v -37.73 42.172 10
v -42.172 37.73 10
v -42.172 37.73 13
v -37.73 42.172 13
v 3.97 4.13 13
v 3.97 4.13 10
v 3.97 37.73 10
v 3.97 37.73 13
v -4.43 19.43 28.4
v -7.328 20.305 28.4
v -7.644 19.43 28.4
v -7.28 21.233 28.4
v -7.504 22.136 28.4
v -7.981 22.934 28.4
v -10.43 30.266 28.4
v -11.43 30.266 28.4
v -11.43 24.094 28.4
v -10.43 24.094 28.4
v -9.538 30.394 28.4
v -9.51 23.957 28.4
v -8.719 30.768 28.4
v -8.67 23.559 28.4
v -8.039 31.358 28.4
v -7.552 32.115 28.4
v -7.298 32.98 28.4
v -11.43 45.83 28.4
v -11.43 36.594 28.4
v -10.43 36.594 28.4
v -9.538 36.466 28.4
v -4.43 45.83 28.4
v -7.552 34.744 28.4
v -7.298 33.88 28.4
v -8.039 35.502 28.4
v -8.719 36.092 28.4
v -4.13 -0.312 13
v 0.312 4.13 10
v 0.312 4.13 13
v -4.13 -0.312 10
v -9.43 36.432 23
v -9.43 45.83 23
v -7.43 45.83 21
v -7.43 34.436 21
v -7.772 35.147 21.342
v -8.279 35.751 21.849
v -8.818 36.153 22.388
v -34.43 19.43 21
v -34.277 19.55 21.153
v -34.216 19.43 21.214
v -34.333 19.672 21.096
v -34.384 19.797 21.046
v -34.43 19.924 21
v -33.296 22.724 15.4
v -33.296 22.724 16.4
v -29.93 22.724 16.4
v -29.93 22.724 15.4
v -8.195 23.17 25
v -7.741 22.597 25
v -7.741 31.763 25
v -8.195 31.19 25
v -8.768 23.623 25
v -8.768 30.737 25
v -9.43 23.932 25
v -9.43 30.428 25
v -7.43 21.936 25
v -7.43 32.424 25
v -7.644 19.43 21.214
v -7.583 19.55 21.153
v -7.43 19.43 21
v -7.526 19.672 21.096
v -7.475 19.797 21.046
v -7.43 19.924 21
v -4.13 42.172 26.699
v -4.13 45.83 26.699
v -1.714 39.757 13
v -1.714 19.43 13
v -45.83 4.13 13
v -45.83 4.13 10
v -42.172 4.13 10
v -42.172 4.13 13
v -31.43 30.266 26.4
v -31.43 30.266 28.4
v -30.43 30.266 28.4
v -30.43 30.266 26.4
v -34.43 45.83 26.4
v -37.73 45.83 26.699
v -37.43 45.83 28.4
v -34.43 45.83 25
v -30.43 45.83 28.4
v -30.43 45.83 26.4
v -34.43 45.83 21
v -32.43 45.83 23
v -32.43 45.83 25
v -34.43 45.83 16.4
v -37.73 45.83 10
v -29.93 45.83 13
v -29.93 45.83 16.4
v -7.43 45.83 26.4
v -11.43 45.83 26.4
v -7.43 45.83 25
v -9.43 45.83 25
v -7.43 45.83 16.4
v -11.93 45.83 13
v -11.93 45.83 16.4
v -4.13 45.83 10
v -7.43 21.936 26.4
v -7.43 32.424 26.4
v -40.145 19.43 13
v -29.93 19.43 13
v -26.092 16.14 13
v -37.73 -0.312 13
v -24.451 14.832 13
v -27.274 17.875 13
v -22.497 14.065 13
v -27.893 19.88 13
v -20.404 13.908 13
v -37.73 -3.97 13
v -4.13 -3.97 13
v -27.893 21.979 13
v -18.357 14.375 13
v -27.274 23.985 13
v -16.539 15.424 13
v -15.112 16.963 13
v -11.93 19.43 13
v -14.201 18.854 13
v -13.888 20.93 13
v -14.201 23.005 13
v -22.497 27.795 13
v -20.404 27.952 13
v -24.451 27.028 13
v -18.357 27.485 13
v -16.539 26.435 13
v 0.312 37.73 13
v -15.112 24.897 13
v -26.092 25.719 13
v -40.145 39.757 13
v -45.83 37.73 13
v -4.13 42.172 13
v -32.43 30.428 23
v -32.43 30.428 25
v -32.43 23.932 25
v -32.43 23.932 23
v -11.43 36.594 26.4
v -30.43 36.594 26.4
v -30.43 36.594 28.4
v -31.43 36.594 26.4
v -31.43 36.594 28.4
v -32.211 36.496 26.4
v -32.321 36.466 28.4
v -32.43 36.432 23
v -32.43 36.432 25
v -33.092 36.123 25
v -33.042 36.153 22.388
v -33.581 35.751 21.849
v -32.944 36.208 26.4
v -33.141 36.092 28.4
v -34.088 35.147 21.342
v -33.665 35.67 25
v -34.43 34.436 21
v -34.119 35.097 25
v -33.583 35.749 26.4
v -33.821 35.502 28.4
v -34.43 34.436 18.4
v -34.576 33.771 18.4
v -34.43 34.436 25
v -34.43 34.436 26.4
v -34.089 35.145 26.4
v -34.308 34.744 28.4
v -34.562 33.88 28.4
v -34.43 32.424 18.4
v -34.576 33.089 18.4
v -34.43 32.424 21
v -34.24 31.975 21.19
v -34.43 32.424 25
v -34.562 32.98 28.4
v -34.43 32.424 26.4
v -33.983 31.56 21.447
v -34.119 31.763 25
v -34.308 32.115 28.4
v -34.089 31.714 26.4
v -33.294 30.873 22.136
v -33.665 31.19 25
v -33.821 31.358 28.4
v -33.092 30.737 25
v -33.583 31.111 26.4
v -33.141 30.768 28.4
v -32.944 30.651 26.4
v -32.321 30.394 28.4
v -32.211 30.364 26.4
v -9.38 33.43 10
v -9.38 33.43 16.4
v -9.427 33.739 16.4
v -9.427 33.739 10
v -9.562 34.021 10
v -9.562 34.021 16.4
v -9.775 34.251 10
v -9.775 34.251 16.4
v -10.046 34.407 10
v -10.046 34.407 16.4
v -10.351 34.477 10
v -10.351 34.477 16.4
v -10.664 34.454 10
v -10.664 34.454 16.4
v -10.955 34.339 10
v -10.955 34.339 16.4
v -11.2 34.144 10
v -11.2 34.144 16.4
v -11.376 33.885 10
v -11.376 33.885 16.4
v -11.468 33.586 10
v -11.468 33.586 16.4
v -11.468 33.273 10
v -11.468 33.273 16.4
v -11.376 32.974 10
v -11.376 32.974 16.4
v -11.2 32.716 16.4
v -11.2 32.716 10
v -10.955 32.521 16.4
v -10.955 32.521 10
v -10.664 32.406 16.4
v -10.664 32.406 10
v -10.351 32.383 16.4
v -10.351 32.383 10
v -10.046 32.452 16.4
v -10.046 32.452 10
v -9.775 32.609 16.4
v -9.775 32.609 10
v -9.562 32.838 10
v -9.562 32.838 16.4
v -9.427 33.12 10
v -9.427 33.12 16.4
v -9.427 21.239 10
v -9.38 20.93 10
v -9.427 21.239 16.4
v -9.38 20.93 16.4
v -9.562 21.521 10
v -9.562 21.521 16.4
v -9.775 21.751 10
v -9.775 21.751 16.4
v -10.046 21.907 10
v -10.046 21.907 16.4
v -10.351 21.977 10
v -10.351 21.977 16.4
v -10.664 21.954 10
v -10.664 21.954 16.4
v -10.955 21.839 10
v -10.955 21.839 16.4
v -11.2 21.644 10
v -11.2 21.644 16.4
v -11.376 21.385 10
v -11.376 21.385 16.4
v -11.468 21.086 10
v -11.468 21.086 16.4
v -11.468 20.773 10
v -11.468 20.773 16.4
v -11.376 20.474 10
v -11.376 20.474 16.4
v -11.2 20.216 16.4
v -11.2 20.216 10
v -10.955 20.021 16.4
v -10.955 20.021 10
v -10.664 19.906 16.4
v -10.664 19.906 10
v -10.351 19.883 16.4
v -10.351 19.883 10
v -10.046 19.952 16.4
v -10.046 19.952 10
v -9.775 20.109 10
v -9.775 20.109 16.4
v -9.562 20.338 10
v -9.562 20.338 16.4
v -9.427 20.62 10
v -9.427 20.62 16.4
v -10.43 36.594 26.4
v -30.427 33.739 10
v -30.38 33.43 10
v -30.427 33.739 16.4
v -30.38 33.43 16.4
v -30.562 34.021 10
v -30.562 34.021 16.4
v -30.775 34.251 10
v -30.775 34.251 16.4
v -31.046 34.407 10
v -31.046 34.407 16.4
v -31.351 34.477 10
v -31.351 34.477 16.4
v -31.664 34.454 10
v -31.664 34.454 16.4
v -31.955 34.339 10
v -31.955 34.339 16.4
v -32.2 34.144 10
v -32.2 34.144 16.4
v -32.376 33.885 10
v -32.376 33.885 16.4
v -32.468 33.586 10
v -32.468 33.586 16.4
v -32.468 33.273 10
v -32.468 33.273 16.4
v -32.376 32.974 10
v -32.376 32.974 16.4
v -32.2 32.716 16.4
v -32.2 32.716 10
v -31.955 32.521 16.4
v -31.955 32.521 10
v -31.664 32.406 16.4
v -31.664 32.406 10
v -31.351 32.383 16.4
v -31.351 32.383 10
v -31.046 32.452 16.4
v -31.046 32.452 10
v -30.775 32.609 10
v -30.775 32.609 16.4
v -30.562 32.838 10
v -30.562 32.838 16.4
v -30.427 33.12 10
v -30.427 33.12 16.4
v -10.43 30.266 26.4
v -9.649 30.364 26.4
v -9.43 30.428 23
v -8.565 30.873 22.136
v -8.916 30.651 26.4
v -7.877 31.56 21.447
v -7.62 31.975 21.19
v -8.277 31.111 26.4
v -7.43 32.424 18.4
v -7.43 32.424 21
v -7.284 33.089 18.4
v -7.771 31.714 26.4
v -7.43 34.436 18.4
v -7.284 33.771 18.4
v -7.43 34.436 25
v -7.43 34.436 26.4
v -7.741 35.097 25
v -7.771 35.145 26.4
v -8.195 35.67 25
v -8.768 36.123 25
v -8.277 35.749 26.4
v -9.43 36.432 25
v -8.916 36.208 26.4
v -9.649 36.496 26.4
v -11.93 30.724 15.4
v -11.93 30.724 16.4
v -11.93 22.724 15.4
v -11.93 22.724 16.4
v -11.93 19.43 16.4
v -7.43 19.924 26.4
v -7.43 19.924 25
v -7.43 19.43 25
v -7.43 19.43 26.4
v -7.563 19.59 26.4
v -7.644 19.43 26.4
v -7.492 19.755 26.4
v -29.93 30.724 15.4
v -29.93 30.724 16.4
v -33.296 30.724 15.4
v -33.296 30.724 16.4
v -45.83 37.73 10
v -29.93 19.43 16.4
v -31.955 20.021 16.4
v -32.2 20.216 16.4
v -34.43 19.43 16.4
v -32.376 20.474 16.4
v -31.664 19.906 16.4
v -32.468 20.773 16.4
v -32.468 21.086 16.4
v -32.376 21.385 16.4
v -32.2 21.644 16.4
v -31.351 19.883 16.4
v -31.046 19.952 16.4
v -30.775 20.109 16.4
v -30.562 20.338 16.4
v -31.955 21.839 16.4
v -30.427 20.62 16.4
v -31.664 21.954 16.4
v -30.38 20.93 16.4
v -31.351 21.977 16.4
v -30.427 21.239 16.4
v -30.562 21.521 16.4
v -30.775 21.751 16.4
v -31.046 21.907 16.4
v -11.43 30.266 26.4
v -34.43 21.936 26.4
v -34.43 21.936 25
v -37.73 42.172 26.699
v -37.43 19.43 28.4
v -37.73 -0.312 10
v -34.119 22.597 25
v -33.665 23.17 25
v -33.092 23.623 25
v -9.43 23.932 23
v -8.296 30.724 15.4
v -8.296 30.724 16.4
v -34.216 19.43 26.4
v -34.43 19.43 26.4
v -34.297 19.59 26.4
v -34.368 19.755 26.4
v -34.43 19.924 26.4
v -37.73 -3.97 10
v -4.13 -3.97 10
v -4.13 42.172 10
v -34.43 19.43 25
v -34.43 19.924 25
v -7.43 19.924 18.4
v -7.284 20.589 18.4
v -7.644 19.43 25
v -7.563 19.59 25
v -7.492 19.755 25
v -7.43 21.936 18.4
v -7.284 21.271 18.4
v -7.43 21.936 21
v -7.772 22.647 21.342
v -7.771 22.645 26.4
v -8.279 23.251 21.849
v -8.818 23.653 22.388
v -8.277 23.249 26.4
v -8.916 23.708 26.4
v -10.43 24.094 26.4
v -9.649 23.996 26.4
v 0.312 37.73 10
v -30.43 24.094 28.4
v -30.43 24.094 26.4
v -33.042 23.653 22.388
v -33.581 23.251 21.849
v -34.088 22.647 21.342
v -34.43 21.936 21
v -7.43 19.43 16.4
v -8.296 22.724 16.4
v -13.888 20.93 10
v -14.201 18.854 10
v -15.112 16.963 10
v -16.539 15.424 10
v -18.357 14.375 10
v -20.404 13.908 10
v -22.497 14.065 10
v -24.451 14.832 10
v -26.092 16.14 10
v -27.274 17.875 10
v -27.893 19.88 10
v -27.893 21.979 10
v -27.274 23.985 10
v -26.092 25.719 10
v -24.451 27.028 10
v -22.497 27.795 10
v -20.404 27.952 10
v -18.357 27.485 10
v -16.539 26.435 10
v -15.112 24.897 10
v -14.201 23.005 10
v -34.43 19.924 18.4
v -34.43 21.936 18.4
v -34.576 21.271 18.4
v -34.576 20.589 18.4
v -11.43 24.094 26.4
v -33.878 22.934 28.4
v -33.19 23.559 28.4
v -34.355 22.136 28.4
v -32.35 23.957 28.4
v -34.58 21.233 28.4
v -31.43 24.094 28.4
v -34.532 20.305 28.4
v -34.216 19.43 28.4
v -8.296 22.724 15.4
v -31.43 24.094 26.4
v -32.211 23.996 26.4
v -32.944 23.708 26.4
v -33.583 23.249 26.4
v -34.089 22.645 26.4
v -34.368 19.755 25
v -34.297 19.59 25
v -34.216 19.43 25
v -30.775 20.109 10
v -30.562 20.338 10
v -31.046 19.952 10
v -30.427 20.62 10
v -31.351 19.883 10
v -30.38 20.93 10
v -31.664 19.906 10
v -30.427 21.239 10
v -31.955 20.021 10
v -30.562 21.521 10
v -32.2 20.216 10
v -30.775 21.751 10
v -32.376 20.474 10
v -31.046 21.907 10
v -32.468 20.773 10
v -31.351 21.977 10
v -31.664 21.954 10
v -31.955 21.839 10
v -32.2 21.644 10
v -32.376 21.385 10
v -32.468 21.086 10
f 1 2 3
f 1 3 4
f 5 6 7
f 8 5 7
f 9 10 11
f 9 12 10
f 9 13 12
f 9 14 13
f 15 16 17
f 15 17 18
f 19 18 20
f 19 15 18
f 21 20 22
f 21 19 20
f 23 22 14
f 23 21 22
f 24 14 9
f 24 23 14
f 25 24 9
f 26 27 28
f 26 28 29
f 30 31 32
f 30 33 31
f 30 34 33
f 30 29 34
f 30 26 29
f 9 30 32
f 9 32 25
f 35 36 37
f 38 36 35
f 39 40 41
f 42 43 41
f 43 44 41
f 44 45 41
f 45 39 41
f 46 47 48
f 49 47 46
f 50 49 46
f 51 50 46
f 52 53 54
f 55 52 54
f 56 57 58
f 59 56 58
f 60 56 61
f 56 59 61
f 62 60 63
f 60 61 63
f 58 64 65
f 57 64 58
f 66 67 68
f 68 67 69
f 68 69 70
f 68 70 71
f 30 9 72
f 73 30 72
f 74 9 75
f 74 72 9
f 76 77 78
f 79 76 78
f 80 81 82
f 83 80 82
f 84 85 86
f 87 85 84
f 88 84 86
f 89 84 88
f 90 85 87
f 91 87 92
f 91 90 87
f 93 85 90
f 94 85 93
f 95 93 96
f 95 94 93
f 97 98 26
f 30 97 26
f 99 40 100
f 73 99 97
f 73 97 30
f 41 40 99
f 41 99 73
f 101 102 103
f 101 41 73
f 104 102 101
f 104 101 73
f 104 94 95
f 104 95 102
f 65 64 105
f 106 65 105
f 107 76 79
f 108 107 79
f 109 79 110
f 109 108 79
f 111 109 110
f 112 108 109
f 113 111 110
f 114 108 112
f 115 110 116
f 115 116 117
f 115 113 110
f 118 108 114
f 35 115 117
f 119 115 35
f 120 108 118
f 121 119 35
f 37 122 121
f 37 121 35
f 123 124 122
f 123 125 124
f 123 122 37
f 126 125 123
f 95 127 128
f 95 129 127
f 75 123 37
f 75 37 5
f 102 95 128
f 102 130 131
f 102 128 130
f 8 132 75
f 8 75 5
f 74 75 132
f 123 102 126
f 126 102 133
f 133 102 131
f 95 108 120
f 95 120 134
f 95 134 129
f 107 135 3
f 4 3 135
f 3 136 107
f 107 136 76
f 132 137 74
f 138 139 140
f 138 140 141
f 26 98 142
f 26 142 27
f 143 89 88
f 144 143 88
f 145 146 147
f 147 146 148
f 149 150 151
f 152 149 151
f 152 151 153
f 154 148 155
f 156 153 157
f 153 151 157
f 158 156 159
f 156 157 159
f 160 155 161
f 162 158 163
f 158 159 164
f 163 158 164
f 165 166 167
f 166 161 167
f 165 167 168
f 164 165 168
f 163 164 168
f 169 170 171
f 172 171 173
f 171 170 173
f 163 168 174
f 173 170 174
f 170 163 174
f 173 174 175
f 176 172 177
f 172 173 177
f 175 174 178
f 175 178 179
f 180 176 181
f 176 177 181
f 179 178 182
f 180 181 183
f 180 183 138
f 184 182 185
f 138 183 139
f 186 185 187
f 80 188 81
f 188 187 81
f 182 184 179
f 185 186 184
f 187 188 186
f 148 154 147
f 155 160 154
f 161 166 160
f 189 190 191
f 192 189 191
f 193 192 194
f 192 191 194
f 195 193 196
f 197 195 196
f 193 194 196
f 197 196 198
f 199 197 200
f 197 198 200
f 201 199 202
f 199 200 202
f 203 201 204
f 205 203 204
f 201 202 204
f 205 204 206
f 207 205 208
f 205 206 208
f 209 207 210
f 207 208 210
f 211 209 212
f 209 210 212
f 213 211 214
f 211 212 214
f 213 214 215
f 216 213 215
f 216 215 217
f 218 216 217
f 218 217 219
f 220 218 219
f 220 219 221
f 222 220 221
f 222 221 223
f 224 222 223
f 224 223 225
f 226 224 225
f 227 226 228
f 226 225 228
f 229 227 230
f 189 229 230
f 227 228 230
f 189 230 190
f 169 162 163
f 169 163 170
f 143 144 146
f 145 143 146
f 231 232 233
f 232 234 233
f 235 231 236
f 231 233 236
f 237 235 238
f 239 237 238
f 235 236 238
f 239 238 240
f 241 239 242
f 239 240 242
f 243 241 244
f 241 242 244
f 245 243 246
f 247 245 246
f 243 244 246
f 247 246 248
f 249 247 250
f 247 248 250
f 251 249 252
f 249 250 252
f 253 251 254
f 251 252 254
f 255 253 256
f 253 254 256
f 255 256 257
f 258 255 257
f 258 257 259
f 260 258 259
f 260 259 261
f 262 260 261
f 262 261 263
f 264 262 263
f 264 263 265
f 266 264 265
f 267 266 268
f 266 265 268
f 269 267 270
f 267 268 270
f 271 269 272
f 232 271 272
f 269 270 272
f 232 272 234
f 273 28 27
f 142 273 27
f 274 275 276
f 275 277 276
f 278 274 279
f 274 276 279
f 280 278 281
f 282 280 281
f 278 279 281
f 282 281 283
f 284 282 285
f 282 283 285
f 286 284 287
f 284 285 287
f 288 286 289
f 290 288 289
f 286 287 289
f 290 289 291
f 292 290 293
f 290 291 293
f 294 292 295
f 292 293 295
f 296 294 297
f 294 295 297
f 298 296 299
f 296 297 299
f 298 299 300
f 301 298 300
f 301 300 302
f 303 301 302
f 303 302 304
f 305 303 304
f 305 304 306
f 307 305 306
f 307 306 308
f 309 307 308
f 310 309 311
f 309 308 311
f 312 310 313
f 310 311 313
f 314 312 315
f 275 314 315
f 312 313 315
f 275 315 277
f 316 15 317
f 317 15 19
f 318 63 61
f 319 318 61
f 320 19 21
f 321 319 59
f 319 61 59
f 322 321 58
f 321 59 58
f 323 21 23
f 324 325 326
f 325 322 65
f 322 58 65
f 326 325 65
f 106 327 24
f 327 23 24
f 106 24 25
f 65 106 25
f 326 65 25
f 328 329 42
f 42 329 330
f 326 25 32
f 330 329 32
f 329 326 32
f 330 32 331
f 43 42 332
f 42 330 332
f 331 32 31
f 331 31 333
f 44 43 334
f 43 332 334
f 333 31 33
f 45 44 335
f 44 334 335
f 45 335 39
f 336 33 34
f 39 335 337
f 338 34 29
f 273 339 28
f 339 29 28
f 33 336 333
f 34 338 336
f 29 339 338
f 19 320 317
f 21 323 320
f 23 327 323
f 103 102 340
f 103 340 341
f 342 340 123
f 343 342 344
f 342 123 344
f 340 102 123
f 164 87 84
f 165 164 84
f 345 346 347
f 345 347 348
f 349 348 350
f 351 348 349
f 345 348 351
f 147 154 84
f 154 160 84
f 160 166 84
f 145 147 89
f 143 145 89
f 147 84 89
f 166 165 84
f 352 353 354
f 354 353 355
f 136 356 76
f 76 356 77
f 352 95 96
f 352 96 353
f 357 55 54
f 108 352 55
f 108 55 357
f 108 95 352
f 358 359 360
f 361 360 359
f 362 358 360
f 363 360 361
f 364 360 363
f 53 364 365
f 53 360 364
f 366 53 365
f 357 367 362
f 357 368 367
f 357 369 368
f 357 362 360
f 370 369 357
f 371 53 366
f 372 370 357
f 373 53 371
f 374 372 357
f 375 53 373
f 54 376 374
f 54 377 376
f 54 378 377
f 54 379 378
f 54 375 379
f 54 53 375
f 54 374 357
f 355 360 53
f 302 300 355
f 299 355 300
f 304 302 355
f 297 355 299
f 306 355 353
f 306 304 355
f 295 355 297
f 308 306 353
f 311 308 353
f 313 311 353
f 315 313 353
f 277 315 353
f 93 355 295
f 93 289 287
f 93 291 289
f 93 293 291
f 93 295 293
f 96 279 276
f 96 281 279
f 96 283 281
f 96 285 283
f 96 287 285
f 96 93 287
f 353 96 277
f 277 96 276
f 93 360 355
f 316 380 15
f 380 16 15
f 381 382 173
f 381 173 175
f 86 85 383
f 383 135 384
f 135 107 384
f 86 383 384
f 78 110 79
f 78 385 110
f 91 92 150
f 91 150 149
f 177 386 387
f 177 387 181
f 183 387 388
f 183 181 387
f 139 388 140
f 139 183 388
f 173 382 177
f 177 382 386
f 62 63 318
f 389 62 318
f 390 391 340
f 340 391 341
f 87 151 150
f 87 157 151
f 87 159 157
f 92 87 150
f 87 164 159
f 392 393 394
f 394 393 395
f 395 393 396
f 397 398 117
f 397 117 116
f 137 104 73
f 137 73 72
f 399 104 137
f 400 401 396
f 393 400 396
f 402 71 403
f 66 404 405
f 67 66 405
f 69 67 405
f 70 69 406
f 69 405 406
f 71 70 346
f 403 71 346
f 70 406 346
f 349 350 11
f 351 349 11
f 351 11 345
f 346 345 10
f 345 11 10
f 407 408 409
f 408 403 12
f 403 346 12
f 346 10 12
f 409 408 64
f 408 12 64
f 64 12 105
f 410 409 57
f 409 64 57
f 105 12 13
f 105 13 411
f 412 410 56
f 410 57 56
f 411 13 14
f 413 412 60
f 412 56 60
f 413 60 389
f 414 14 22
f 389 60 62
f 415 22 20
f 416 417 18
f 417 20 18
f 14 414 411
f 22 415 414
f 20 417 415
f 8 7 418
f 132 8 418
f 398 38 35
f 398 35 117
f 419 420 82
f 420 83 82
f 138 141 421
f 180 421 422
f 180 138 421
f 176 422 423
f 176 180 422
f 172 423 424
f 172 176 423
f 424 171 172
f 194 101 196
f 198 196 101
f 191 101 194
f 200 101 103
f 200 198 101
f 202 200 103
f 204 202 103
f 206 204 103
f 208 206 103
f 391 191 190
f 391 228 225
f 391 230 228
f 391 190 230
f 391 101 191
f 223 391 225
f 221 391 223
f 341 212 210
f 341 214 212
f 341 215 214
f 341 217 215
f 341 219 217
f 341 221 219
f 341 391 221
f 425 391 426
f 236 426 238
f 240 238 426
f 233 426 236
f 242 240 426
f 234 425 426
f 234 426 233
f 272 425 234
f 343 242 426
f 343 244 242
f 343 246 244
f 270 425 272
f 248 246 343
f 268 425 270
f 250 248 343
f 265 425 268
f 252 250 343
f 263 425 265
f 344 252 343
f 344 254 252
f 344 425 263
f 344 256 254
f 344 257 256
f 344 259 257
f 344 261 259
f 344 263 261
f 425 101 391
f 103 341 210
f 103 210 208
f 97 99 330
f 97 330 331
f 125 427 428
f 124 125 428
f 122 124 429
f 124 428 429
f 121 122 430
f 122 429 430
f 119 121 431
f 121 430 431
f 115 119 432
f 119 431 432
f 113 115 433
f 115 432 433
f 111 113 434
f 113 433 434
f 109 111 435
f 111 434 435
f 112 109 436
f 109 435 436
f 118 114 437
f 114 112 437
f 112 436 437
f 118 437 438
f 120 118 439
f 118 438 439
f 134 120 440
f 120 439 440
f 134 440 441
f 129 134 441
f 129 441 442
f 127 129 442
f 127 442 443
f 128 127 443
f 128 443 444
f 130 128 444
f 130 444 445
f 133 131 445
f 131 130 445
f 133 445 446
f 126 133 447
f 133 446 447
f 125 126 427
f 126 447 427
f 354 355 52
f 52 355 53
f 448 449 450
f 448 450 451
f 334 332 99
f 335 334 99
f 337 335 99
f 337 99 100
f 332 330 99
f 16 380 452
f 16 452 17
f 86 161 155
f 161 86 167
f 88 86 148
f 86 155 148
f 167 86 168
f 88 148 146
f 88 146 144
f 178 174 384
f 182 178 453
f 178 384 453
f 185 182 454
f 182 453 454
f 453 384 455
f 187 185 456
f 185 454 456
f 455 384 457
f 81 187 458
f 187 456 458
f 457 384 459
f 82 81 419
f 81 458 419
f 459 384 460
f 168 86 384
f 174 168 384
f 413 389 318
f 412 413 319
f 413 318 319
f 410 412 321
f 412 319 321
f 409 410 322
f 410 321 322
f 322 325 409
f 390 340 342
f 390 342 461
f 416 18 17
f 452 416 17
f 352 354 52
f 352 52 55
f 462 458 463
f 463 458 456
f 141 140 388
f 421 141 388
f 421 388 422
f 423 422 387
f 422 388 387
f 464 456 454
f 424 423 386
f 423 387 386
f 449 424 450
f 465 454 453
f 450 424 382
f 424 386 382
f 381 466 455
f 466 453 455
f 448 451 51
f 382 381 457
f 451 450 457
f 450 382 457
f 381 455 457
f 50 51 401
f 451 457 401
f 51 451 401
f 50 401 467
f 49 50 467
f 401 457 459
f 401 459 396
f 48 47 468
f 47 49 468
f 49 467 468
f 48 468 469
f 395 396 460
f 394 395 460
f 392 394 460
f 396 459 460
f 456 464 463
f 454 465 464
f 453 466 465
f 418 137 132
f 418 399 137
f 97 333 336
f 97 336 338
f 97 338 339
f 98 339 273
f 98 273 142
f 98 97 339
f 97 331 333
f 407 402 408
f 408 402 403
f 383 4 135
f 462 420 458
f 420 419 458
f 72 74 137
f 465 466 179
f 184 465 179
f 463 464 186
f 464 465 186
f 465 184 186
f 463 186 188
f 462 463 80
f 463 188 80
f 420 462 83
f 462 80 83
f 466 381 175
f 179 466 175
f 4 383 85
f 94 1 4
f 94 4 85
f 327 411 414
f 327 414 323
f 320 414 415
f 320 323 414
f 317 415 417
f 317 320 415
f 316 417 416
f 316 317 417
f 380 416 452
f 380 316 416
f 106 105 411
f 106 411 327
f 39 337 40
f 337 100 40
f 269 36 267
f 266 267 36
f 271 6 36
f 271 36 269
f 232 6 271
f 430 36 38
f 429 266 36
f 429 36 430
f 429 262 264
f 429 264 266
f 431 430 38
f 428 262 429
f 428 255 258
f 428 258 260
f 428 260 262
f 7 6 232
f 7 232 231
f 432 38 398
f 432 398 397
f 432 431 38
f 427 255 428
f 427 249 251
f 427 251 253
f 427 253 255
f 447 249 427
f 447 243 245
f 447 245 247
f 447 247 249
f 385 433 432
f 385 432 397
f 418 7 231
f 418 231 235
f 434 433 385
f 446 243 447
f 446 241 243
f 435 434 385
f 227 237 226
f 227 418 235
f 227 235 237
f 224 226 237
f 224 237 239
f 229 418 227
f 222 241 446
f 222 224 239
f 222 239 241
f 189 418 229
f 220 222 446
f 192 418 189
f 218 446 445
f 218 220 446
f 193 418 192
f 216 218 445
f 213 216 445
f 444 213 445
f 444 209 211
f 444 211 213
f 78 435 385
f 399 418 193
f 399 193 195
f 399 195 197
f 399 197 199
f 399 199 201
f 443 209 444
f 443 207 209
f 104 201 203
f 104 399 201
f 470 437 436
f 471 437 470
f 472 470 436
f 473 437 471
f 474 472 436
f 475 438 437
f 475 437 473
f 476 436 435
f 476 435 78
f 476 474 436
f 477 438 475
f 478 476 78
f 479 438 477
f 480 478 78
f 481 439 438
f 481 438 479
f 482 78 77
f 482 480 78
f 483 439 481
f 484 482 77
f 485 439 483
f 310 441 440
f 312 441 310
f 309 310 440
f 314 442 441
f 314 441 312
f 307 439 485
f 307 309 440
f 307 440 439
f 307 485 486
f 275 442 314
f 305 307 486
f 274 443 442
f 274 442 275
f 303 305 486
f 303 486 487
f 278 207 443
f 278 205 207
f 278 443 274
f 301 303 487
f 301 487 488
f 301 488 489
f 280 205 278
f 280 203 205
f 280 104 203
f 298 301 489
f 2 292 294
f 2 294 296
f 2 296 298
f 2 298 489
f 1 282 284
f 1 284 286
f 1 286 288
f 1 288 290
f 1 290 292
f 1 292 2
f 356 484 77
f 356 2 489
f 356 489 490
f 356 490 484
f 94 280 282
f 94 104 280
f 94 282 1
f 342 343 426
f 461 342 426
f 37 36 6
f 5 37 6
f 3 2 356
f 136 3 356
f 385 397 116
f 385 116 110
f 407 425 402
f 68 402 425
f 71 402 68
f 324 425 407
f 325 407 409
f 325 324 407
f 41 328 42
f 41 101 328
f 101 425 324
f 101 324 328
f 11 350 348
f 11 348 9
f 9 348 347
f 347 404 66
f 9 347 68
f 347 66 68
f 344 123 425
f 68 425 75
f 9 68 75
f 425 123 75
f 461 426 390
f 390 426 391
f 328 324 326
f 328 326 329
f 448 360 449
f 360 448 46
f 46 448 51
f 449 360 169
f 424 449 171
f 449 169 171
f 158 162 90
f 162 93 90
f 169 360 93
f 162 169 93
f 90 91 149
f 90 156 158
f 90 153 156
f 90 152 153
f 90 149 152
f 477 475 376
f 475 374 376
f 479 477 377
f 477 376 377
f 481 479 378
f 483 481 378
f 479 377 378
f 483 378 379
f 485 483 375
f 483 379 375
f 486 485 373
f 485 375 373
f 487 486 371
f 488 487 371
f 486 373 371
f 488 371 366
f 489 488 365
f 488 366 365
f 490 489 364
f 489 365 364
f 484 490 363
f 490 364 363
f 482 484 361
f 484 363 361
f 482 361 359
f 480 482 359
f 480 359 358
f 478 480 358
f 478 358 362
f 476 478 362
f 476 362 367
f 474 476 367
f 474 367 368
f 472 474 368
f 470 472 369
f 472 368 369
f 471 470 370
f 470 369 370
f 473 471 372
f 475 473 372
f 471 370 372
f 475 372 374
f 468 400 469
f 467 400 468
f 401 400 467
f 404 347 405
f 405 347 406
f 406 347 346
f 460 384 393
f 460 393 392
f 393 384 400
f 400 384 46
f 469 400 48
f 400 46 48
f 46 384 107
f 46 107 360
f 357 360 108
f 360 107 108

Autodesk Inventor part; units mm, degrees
ref_plane "YZ Plane" through (0, 0, 0) normal (1, 0, 0) x (0, 1, 0)
ref_plane "XZ Plane" through (0, 0, 0) normal (0, 1, 0) x (-1, 0, 0)
ref_plane "Work Plane1" through (0, 0, 10) normal (0, 0, 1) x (1, 0, 0)
sketch "Sketch1" plane through (0, 0, 10) normal (0, 0, 1) x (1, 0, 0)
  line L0 (-4.0299, -0.3538) -> (-2.2322, 1.4439) construction
  arc A0 (-1.4439, 2.2322) -> (-2.2322, 1.4439) centre (-0.9299, 0.9299) ccw construction
  line L1 (-1.4439, 2.2322) -> (0.3538, 4.0299) construction
  line L2 (-37.8299, 42.2137) -> (-37.8299, 45.8299) construction
  line L3 (-37.8299, 45.8299) -> (-4.0299, 45.8299) construction
  line L4 (-4.0299, 45.8299) -> (-4.0299, 42.2137) construction
  line L5 (-4.0299, 4.0299) -> (0.3538, 4.0299) projected
  circle A1 centre (-20.9299, 20.9299) radius 17.5 projected
  line L6 (-20.9299, 58.9723) -> (17.1124, 20.9299) construction
  line L7 (17.1124, 20.9299) -> (-20.9299, -17.1124) construction
  line L8 (-20.9299, -17.1124) -> (-58.9723, 20.9299) construction
  line L9 (-58.9723, 20.9299) -> (-20.9299, 58.9723) construction
  line L10 (-20.9299, 58.9723) -> (-20.9299, -17.1124) construction
  line L11 (17.1124, 20.9299) -> (-58.9723, 20.9299) construction
  line L12 (-20.9299, 58.9723) -> (32.8701, 58.9723) construction
  line L13 (-43.4299, 43.4299) -> (1.5701, 43.4299) construction
  line L14 (1.5701, 43.4299) -> (1.5701, -1.5701) construction
  line L15 (1.5701, -1.5701) -> (-43.4299, -1.5701) construction
  line L16 (-43.4299, -1.5701) -> (-43.4299, 43.4299) construction
  line L17 (-43.4299, 43.4299) -> (1.5701, -1.5701) construction
  line L18 (1.5701, 43.4299) -> (-43.4299, -1.5701) construction
  line L19 (-43.4299, 5.3876) -> (-43.4299, 36.4723)
  line L20 (-43.4299, 36.4723) -> (-36.4723, 43.4299)
  line L21 (-36.4723, 43.4299) -> (-5.3876, 43.4299)
  line L22 (-5.3876, 43.4299) -> (1.5701, 36.4723)
  line L23 (1.5701, 36.4723) -> (1.5701, 5.3876)
  line L24 (1.5701, 5.3876) -> (-5.3876, -1.5701)
  line L25 (-5.3876, -1.5701) -> (-36.4723, -1.5701)
  line L26 (-36.4723, -1.5701) -> (-43.4299, 5.3876)
  line L27 (-4.0299, 42.2137) -> (-37.8299, 42.2137) projected
  line L28 (-4.0299, -0.3538) -> (-4.0299, 4.0299) projected
  circle A2 centre (-20.9299, 20.9299) radius 7.0417
  point P0 (-37.8299, 4.0299)
  dimension "d18" = 53.8
  dimension "d19" = 45
  dimension "d20" = 53.8
  dimension "d21" = 45
  dimension "d22" = 45
extrude "Extrusion1" add sketch "Sketch1" along normal blind 3 contours L28 L24 L25 L26 L19 L20 L27 L22 L23 L5 | L5 L24 L28 | L27 L20 L21 L22 | A1
sketch "Sketch3" plane through (0, 0, 10) normal (0, 0, -1) x (-1, 0, 0)
  line L0 (37.8299, -0.4701) -> (37.8299, 4.0299) construction
  line L1 (4.0299, 4.0299) -> (4.0299, -0.4701) construction
  line L2 (37.8299, -0.4701) -> (37.8299, 1.1886) construction
  line L3 (4.0299, -3.9701) -> (4.0299, -0.3538) construction
  line L4 (45.8299, 4.0299) -> (42.2137, 4.0299) construction
  line L5 (-0.3538, 4.0299) -> (-3.9701, 4.0299) construction
  line L6 (-3.9701, 37.8299) -> (-0.3538, 37.8299) construction
  line L7 (4.0299, 42.2137) -> (4.0299, 45.8299) construction
  line L8 (37.8299, 45.8299) -> (37.8299, 42.2137) construction
  line L9 (42.2137, 37.8299) -> (45.8299, 37.8299) construction
  line L10 (37.8299, 37.7299) -> (45.8299, 37.7299)
  line L11 (45.8299, 37.7299) -> (45.8299, 4.1299)
  line L12 (45.8299, 4.1299) -> (37.8299, 4.1299)
  line L13 (37.8299, 4.1299) -> (37.8299, 37.7299)
  line L14 (37.7299, 4.0299) -> (4.1299, 4.0299)
  line L15 (4.1299, 4.0299) -> (4.1299, -3.9701)
  line L16 (4.1299, -3.9701) -> (37.7299, -3.9701)
  line L17 (37.7299, -3.9701) -> (37.7299, 4.0299)
  line L18 (4.0299, 4.1299) -> (-3.9701, 4.1299)
  line L19 (-3.9701, 4.1299) -> (-3.9701, 37.7299)
  line L20 (-3.9701, 37.7299) -> (4.0299, 37.7299)
  line L21 (4.0299, 37.7299) -> (4.0299, 4.1299)
  line L22 (4.1299, 37.8299) -> (37.7299, 37.8299)
  line L23 (37.7299, 37.8299) -> (37.7299, 45.8299)
  line L24 (37.7299, 45.8299) -> (4.1299, 45.8299)
  line L25 (4.1299, 45.8299) -> (4.1299, 37.8299)
  point P0 (0, 0)
  dimension "d23" = 0.1
  dimension "d24" = 0.1
  dimension "d25" = 0.1
  dimension "d26" = 0.1
  dimension "d27" = 0.1
extrude "Extrusion3" add sketch "Sketch3" against normal up to surface (3 mm away)
sketch "Sketch4" plane through (0, 0, 13) normal (0, 0, 1) x (1, 0, 0)
  line L0 (-33.4299, 35.4299) -> (-33.4299, 11.4299) construction
  line L1 (-33.4299, 11.4299) -> (-8.4299, 11.4299) construction
  line L2 (-8.4299, 11.4299) -> (-8.4299, 35.4299) construction
  line L3 (-8.4299, 35.4299) -> (-33.4299, 35.4299) construction
  circle A0 centre (-10.4299, 33.4299) radius 1.05 construction
  circle A1 centre (-10.4299, 20.9299) radius 1.05 construction
  circle A2 centre (-31.4299, 20.9299) radius 1.05 construction
  circle A3 centre (-31.4299, 33.4299) radius 1.05 construction
  line L4 (-15.4299, 29.8299) -> (-12.4299, 29.8299) construction
  line L5 (-15.4299, 31.8299) -> (-15.4299, 29.8299) construction
  line L6 (-12.4299, 31.8299) -> (-15.4299, 31.8299) construction
  line L7 (-12.4299, 29.8299) -> (-12.4299, 31.8299) construction
  line L8 (-8.4299, 35.4299) -> (-11.9299, 35.4299)
  line L9 (-11.9299, 35.4299) -> (-11.9299, 19.4299)
  line L10 (-11.9299, 19.4299) -> (-8.4299, 19.4299)
  line L11 (-8.4299, 19.4299) -> (-8.4299, 35.4299)
  line L12 (-33.4299, 35.4299) -> (-29.9299, 35.4299)
  line L13 (-29.9299, 35.4299) -> (-29.9299, 19.4299)
  line L14 (-29.9299, 19.4299) -> (-33.4299, 19.4299)
  line L15 (-33.4299, 19.4299) -> (-33.4299, 35.4299)
  line L16 (-33.4299, 35.4299) -> (-37.4299, 35.4299)
  line L17 (-37.4299, 35.4299) -> (-37.4299, 19.4299)
  line L18 (-37.4299, 19.4299) -> (-33.4299, 19.4299)
  line L19 (-33.4299, 19.4299) -> (-33.4299, 35.4299)
  line L20 (-8.4299, 35.4299) -> (-4.4299, 35.4299)
  line L21 (-4.4299, 35.4299) -> (-4.4299, 19.4299)
  line L22 (-4.4299, 19.4299) -> (-8.4299, 19.4299)
  line L23 (-8.4299, 19.4299) -> (-8.4299, 35.4299)
  point P0 (0, 0)
  dimension "d30" = 3.5
  dimension "d31" = 16
  dimension "d32" = 3.5
  dimension "d37" = 4
  dimension "d38" = 4
ref_plane "Work Plane3" through (-33.4299, 11.4299, 16.4) normal (0, 0, -1) x (0, 1, 0)
extrude "Extrusion4" add sketch "Sketch4" along normal up to surface (3.4 mm away)
sketch "Sketch5" plane through (-11.9299, 35.4299, 16.4) normal (0, 0, 1) x (1, 0, 0)
  circle A0 centre (1.5, -14.5) radius 1.05 projected
  circle A1 centre (1.5, -2) radius 1.05 projected
  circle A2 centre (-19.5, -2) radius 1.05 projected
  circle A3 centre (-19.5, -14.5) radius 1.05 projected
  point P0 (11.9299, -35.4299)
extrude "Extrusion5" cut sketch "Sketch5" against normal through all
sketch "Sketch7" plane through (-37.4299, 35.4299, 13) normal (0, 1, 0) x (1, 0, 0)
  line L0 (4.95, -3.4) -> (4.95, 3) projected
  line L1 (7.5, -3.4) -> (0, -3.4) projected
  line L2 (7.5, 0) -> (7.5, -3.4) projected
  line L3 (0, 0) -> (7.5, 0) projected
  line L4 (0, 0) -> (0, -3.4) projected
  line L5 (33, -3.4) -> (25.5, -3.4) projected
  line L6 (33, 0) -> (33, -3.4) projected
  line L7 (25.5, 0) -> (33, 0) projected
  line L8 (25.5, 0) -> (25.5, -3.4) projected
  line L9 (0, -3.4) -> (7.5, -3.4) projected
  line L10 (0, -3.4) -> (3, -3.4)
  line L11 (3, -3.4) -> (3, -13.4)
  line L12 (3, -13.4) -> (0, -13.4)
  line L13 (0, -13.4) -> (0, -3.4)
  line L14 (33, -3.4) -> (30, -3.4)
  line L15 (30, -3.4) -> (30, -13.4)
  line L16 (30, -13.4) -> (33, -13.4)
  line L17 (33, -13.4) -> (33, -3.4)
  line L18 (0, -13.4) -> (7, -13.4)
  line L19 (7, -13.4) -> (7, -15.4)
  line L20 (7, -15.4) -> (0, -15.4)
  line L21 (0, -15.4) -> (0, -13.4)
  line L22 (33, -13.4) -> (26, -13.4)
  line L23 (26, -13.4) -> (26, -15.4)
  line L24 (26, -15.4) -> (33, -15.4)
  line L25 (33, -15.4) -> (33, -13.4)
  line L26 (3, -12) -> (5, -12)
  line L27 (5, -12) -> (5, -10)
  line L28 (5, -10) -> (3, -10)
  line L29 (3, -10) -> (3, -12)
  line L30 (30, -12) -> (28, -12)
  line L31 (28, -12) -> (28, -10)
  line L32 (28, -10) -> (30, -10)
  line L33 (30, -10) -> (30, -12)
  line L34 (5, -10) -> (3, -8)
  line L35 (5, -10) -> (7.8284, -10) construction
  line L36 (28, -10) -> (30, -8)
  line L37 (0, -15.4) -> (-2.7154, 0)
  line L38 (-4.7423, 0) -> (-0.3, 0) projected
  line L39 (0, -15.4) -> (15.6376, -15.4) construction
  line L40 (-2.7154, 0) -> (0, 0)
  line L41 (0, -15.4) -> (0, 0)
  line L42 (33, -15.4) -> (35.7154, 0)
  line L43 (33, -15.4) -> (48.6376, -15.4) construction
  line L44 (35.7154, 0) -> (33, 0)
  line L45 (37.7423, 0) -> (33.3, 0) projected
  line L46 (33, -15.4) -> (33, 0)
  point P0 (37.4299, 13)
  dimension "d39" = 3
  dimension "d40" = 10
  dimension "d41" = 3
  dimension "d42" = 7
  dimension "d43" = 2
  dimension "d44" = 7
  dimension "d47" = 27
  dimension "d48" = 1.4
  dimension "d49" = 2
  dimension "d50" = 2
  dimension "d51" = 2
  dimension "d52" = 135
  dimension "d53" = 100
  dimension "d54" = 80
extrude "Extrusion6" add sketch "Sketch7" against normal up to surface (16 mm away) contours L11 L12 L13 L1 | L4 L13 L21 L37 L38 L40 | L34 L28 L11 | L12 L18 L19 L20 L21 | L28 L27 L26 L11 | L17 L16 L15 L5 | L6 L44 L42 L25 L17 | L25 L24 L23 L22 L16 | L15 L32 L36 | L15 L30 L31 L32
sketch "Sketch8" plane through (-29.9299, 35.4299, 16.4) normal (0, 1, 0) x (1, 0, 0)
  line L0 (0, 0) -> (-4.5, 0) projected
  line L1 (0, 3.4) -> (0, 0) projected
  line L2 (-10.2154, 3.4) -> (0, 3.4) projected
  line L3 (-10.2154, 3.4) -> (-7.5, -12) projected
  line L4 (-7.5, -12) -> (-0.5, -12) projected
  line L5 (-0.5, -12) -> (-0.5, -10) projected
  line L6 (-0.5, -10) -> (-4.5, -10) projected
  line L7 (-4.5, -10) -> (-4.5, -8.6) projected
  line L8 (-4.5, -8.6) -> (-2.5, -8.6) projected
  line L9 (-2.5, -8.6) -> (-2.5, -6.6) projected
  line L10 (-2.5, -6.6) -> (-4.5, -4.6) projected
  line L11 (-4.5, -4.6) -> (-4.5, 0) projected
  line L12 (18, 3.4) -> (28.2154, 3.4) projected
  line L13 (18, 3.4) -> (18, 0) projected
  line L14 (22.5, 0) -> (18, 0) projected
  line L15 (22.5, 0) -> (22.5, -4.6) projected
  line L16 (22.5, -4.6) -> (20.5, -6.6) projected
  line L17 (20.5, -6.6) -> (20.5, -8.6) projected
  line L18 (20.5, -8.6) -> (22.5, -8.6) projected
  line L19 (22.5, -8.6) -> (22.5, -10) projected
  line L20 (22.5, -10) -> (18.5, -10) projected
  line L21 (18.5, -10) -> (18.5, -12) projected
  line L22 (18.5, -12) -> (25.5, -12) projected
  line L23 (25.5, -12) -> (28.2154, 3.4) projected
  point P0 (29.9299, 16.4)
extrude "Extrusion7" add sketch "Sketch8" along normal up to surface (10.4 mm away)
sketch "Sketch9" plane through (-37.7299, 45.8299, 13) normal (0, 0, -1) x (-1, 0, 0)
  line L0 (0, -3.6577) -> (2.4154, -6.0731) projected
  line L1 (2.4154, -6.0731) -> (2.4154, 0) projected
  line L2 (2.4154, 0) -> (0, 0) projected
  line L3 (0, -3.6577) -> (0, 0) projected
  line L4 (-33.6, 0) -> (-33.6, -3.6577) projected
  line L5 (-33.6, 0) -> (-36.0154, 0) projected
  line L6 (-36.0154, -6.0731) -> (-36.0154, 0) projected
  line L7 (-36.0154, -6.0731) -> (-33.6, -3.6577) projected
  point P0 (-37.7299, -45.8299)
extrude "Extrusion8" cut sketch "Sketch9" against normal through all
sketch "Sketch10" plane through (-29.9299, 19.4299, 16.4) normal (0, 0, 1) x (1, 0, 0)
  line L0 (0, 26.4) -> (0, 0) projected
  line L1 (18, 0) -> (18, 26.4) projected
  line L2 (-3.3664, 3.2942) -> (21.6336, 3.2942)
  line L3 (21.6336, 3.2942) -> (21.6336, 11.2942)
  line L4 (21.6336, 11.2942) -> (-3.3664, 11.2942)
  line L5 (-3.3664, 11.2942) -> (-3.3664, 3.2942)
  line L6 (-3.3664, 3.2942) -> (21.6336, 11.2942) construction
  line L7 (21.6336, 3.2942) -> (-3.3664, 11.2942) construction
  point P0 (29.9299, -19.4299)
  point P1 (9.1336, 7.2942)
  dimension "d59" = 25
  dimension "d60" = 8
extrude "Extrusion9" cut sketch "Sketch10" against normal blind 1
sketch "Sketch11" plane through (-37.4299, 19.4299, 28.4) normal (0, 0, 1) x (1, 0, 0)
  line L0 (0, 0) -> (7, 0) projected
  line L1 (7, 0) -> (7, 26.4) projected
  line L2 (7, 26.4) -> (0, 26.4) projected
  line L3 (0, 26.4) -> (0, 0) projected
  line L4 (26, 0) -> (33, 0) projected
  line L5 (33, 0) -> (33, 26.4) projected
  line L6 (33, 26.4) -> (26, 26.4) projected
  line L7 (26, 0) -> (26, 26.4) projected
  circle A0 centre (16.5, 1.5) radius 7.0417 projected
  circle A1 centre (6, 1.5) radius 1.05 construction
  circle A2 centre (6, 14) radius 1.05 construction
  line L8 (27, 1.5) -> (6, 1.5) construction
  line L9 (27, 4.6642) -> (6, 4.6642)
  line L10 (6, -1.6642) -> (27, -1.6642)
  arc A3 (27, -1.6642) -> (27, 4.6642) centre (27, 1.5) ccw
  arc A4 (6, 4.6642) -> (6, -1.6642) centre (6, 1.5) ccw
  line L11 (27, 14) -> (6, 14) construction
  line L12 (27, 17.1642) -> (6, 17.1642)
  line L13 (6, 10.8358) -> (27, 10.8358)
  arc A5 (27, 10.8358) -> (27, 17.1642) centre (27, 14) ccw
  arc A6 (6, 17.1642) -> (6, 10.8358) centre (6, 14) ccw
  point P0 (37.4299, -19.4299)
  point P1 (16.5, 14)
extrude "Extrusion10" cut sketch "Sketch11" against normal blind 10 contours A4 L9 L1 L0 | L0 L1 L9 A0 L10 A4 | A0 L9 L10 | L12 L7 L13 L1 | L1 L13 A6 L12 | A0 L9 L7 L4 A3 L10 | L12 A5 L13 L7 | L9 A3 L4 L7
properties part number "50_Cube_Insert_Thorlabs"
